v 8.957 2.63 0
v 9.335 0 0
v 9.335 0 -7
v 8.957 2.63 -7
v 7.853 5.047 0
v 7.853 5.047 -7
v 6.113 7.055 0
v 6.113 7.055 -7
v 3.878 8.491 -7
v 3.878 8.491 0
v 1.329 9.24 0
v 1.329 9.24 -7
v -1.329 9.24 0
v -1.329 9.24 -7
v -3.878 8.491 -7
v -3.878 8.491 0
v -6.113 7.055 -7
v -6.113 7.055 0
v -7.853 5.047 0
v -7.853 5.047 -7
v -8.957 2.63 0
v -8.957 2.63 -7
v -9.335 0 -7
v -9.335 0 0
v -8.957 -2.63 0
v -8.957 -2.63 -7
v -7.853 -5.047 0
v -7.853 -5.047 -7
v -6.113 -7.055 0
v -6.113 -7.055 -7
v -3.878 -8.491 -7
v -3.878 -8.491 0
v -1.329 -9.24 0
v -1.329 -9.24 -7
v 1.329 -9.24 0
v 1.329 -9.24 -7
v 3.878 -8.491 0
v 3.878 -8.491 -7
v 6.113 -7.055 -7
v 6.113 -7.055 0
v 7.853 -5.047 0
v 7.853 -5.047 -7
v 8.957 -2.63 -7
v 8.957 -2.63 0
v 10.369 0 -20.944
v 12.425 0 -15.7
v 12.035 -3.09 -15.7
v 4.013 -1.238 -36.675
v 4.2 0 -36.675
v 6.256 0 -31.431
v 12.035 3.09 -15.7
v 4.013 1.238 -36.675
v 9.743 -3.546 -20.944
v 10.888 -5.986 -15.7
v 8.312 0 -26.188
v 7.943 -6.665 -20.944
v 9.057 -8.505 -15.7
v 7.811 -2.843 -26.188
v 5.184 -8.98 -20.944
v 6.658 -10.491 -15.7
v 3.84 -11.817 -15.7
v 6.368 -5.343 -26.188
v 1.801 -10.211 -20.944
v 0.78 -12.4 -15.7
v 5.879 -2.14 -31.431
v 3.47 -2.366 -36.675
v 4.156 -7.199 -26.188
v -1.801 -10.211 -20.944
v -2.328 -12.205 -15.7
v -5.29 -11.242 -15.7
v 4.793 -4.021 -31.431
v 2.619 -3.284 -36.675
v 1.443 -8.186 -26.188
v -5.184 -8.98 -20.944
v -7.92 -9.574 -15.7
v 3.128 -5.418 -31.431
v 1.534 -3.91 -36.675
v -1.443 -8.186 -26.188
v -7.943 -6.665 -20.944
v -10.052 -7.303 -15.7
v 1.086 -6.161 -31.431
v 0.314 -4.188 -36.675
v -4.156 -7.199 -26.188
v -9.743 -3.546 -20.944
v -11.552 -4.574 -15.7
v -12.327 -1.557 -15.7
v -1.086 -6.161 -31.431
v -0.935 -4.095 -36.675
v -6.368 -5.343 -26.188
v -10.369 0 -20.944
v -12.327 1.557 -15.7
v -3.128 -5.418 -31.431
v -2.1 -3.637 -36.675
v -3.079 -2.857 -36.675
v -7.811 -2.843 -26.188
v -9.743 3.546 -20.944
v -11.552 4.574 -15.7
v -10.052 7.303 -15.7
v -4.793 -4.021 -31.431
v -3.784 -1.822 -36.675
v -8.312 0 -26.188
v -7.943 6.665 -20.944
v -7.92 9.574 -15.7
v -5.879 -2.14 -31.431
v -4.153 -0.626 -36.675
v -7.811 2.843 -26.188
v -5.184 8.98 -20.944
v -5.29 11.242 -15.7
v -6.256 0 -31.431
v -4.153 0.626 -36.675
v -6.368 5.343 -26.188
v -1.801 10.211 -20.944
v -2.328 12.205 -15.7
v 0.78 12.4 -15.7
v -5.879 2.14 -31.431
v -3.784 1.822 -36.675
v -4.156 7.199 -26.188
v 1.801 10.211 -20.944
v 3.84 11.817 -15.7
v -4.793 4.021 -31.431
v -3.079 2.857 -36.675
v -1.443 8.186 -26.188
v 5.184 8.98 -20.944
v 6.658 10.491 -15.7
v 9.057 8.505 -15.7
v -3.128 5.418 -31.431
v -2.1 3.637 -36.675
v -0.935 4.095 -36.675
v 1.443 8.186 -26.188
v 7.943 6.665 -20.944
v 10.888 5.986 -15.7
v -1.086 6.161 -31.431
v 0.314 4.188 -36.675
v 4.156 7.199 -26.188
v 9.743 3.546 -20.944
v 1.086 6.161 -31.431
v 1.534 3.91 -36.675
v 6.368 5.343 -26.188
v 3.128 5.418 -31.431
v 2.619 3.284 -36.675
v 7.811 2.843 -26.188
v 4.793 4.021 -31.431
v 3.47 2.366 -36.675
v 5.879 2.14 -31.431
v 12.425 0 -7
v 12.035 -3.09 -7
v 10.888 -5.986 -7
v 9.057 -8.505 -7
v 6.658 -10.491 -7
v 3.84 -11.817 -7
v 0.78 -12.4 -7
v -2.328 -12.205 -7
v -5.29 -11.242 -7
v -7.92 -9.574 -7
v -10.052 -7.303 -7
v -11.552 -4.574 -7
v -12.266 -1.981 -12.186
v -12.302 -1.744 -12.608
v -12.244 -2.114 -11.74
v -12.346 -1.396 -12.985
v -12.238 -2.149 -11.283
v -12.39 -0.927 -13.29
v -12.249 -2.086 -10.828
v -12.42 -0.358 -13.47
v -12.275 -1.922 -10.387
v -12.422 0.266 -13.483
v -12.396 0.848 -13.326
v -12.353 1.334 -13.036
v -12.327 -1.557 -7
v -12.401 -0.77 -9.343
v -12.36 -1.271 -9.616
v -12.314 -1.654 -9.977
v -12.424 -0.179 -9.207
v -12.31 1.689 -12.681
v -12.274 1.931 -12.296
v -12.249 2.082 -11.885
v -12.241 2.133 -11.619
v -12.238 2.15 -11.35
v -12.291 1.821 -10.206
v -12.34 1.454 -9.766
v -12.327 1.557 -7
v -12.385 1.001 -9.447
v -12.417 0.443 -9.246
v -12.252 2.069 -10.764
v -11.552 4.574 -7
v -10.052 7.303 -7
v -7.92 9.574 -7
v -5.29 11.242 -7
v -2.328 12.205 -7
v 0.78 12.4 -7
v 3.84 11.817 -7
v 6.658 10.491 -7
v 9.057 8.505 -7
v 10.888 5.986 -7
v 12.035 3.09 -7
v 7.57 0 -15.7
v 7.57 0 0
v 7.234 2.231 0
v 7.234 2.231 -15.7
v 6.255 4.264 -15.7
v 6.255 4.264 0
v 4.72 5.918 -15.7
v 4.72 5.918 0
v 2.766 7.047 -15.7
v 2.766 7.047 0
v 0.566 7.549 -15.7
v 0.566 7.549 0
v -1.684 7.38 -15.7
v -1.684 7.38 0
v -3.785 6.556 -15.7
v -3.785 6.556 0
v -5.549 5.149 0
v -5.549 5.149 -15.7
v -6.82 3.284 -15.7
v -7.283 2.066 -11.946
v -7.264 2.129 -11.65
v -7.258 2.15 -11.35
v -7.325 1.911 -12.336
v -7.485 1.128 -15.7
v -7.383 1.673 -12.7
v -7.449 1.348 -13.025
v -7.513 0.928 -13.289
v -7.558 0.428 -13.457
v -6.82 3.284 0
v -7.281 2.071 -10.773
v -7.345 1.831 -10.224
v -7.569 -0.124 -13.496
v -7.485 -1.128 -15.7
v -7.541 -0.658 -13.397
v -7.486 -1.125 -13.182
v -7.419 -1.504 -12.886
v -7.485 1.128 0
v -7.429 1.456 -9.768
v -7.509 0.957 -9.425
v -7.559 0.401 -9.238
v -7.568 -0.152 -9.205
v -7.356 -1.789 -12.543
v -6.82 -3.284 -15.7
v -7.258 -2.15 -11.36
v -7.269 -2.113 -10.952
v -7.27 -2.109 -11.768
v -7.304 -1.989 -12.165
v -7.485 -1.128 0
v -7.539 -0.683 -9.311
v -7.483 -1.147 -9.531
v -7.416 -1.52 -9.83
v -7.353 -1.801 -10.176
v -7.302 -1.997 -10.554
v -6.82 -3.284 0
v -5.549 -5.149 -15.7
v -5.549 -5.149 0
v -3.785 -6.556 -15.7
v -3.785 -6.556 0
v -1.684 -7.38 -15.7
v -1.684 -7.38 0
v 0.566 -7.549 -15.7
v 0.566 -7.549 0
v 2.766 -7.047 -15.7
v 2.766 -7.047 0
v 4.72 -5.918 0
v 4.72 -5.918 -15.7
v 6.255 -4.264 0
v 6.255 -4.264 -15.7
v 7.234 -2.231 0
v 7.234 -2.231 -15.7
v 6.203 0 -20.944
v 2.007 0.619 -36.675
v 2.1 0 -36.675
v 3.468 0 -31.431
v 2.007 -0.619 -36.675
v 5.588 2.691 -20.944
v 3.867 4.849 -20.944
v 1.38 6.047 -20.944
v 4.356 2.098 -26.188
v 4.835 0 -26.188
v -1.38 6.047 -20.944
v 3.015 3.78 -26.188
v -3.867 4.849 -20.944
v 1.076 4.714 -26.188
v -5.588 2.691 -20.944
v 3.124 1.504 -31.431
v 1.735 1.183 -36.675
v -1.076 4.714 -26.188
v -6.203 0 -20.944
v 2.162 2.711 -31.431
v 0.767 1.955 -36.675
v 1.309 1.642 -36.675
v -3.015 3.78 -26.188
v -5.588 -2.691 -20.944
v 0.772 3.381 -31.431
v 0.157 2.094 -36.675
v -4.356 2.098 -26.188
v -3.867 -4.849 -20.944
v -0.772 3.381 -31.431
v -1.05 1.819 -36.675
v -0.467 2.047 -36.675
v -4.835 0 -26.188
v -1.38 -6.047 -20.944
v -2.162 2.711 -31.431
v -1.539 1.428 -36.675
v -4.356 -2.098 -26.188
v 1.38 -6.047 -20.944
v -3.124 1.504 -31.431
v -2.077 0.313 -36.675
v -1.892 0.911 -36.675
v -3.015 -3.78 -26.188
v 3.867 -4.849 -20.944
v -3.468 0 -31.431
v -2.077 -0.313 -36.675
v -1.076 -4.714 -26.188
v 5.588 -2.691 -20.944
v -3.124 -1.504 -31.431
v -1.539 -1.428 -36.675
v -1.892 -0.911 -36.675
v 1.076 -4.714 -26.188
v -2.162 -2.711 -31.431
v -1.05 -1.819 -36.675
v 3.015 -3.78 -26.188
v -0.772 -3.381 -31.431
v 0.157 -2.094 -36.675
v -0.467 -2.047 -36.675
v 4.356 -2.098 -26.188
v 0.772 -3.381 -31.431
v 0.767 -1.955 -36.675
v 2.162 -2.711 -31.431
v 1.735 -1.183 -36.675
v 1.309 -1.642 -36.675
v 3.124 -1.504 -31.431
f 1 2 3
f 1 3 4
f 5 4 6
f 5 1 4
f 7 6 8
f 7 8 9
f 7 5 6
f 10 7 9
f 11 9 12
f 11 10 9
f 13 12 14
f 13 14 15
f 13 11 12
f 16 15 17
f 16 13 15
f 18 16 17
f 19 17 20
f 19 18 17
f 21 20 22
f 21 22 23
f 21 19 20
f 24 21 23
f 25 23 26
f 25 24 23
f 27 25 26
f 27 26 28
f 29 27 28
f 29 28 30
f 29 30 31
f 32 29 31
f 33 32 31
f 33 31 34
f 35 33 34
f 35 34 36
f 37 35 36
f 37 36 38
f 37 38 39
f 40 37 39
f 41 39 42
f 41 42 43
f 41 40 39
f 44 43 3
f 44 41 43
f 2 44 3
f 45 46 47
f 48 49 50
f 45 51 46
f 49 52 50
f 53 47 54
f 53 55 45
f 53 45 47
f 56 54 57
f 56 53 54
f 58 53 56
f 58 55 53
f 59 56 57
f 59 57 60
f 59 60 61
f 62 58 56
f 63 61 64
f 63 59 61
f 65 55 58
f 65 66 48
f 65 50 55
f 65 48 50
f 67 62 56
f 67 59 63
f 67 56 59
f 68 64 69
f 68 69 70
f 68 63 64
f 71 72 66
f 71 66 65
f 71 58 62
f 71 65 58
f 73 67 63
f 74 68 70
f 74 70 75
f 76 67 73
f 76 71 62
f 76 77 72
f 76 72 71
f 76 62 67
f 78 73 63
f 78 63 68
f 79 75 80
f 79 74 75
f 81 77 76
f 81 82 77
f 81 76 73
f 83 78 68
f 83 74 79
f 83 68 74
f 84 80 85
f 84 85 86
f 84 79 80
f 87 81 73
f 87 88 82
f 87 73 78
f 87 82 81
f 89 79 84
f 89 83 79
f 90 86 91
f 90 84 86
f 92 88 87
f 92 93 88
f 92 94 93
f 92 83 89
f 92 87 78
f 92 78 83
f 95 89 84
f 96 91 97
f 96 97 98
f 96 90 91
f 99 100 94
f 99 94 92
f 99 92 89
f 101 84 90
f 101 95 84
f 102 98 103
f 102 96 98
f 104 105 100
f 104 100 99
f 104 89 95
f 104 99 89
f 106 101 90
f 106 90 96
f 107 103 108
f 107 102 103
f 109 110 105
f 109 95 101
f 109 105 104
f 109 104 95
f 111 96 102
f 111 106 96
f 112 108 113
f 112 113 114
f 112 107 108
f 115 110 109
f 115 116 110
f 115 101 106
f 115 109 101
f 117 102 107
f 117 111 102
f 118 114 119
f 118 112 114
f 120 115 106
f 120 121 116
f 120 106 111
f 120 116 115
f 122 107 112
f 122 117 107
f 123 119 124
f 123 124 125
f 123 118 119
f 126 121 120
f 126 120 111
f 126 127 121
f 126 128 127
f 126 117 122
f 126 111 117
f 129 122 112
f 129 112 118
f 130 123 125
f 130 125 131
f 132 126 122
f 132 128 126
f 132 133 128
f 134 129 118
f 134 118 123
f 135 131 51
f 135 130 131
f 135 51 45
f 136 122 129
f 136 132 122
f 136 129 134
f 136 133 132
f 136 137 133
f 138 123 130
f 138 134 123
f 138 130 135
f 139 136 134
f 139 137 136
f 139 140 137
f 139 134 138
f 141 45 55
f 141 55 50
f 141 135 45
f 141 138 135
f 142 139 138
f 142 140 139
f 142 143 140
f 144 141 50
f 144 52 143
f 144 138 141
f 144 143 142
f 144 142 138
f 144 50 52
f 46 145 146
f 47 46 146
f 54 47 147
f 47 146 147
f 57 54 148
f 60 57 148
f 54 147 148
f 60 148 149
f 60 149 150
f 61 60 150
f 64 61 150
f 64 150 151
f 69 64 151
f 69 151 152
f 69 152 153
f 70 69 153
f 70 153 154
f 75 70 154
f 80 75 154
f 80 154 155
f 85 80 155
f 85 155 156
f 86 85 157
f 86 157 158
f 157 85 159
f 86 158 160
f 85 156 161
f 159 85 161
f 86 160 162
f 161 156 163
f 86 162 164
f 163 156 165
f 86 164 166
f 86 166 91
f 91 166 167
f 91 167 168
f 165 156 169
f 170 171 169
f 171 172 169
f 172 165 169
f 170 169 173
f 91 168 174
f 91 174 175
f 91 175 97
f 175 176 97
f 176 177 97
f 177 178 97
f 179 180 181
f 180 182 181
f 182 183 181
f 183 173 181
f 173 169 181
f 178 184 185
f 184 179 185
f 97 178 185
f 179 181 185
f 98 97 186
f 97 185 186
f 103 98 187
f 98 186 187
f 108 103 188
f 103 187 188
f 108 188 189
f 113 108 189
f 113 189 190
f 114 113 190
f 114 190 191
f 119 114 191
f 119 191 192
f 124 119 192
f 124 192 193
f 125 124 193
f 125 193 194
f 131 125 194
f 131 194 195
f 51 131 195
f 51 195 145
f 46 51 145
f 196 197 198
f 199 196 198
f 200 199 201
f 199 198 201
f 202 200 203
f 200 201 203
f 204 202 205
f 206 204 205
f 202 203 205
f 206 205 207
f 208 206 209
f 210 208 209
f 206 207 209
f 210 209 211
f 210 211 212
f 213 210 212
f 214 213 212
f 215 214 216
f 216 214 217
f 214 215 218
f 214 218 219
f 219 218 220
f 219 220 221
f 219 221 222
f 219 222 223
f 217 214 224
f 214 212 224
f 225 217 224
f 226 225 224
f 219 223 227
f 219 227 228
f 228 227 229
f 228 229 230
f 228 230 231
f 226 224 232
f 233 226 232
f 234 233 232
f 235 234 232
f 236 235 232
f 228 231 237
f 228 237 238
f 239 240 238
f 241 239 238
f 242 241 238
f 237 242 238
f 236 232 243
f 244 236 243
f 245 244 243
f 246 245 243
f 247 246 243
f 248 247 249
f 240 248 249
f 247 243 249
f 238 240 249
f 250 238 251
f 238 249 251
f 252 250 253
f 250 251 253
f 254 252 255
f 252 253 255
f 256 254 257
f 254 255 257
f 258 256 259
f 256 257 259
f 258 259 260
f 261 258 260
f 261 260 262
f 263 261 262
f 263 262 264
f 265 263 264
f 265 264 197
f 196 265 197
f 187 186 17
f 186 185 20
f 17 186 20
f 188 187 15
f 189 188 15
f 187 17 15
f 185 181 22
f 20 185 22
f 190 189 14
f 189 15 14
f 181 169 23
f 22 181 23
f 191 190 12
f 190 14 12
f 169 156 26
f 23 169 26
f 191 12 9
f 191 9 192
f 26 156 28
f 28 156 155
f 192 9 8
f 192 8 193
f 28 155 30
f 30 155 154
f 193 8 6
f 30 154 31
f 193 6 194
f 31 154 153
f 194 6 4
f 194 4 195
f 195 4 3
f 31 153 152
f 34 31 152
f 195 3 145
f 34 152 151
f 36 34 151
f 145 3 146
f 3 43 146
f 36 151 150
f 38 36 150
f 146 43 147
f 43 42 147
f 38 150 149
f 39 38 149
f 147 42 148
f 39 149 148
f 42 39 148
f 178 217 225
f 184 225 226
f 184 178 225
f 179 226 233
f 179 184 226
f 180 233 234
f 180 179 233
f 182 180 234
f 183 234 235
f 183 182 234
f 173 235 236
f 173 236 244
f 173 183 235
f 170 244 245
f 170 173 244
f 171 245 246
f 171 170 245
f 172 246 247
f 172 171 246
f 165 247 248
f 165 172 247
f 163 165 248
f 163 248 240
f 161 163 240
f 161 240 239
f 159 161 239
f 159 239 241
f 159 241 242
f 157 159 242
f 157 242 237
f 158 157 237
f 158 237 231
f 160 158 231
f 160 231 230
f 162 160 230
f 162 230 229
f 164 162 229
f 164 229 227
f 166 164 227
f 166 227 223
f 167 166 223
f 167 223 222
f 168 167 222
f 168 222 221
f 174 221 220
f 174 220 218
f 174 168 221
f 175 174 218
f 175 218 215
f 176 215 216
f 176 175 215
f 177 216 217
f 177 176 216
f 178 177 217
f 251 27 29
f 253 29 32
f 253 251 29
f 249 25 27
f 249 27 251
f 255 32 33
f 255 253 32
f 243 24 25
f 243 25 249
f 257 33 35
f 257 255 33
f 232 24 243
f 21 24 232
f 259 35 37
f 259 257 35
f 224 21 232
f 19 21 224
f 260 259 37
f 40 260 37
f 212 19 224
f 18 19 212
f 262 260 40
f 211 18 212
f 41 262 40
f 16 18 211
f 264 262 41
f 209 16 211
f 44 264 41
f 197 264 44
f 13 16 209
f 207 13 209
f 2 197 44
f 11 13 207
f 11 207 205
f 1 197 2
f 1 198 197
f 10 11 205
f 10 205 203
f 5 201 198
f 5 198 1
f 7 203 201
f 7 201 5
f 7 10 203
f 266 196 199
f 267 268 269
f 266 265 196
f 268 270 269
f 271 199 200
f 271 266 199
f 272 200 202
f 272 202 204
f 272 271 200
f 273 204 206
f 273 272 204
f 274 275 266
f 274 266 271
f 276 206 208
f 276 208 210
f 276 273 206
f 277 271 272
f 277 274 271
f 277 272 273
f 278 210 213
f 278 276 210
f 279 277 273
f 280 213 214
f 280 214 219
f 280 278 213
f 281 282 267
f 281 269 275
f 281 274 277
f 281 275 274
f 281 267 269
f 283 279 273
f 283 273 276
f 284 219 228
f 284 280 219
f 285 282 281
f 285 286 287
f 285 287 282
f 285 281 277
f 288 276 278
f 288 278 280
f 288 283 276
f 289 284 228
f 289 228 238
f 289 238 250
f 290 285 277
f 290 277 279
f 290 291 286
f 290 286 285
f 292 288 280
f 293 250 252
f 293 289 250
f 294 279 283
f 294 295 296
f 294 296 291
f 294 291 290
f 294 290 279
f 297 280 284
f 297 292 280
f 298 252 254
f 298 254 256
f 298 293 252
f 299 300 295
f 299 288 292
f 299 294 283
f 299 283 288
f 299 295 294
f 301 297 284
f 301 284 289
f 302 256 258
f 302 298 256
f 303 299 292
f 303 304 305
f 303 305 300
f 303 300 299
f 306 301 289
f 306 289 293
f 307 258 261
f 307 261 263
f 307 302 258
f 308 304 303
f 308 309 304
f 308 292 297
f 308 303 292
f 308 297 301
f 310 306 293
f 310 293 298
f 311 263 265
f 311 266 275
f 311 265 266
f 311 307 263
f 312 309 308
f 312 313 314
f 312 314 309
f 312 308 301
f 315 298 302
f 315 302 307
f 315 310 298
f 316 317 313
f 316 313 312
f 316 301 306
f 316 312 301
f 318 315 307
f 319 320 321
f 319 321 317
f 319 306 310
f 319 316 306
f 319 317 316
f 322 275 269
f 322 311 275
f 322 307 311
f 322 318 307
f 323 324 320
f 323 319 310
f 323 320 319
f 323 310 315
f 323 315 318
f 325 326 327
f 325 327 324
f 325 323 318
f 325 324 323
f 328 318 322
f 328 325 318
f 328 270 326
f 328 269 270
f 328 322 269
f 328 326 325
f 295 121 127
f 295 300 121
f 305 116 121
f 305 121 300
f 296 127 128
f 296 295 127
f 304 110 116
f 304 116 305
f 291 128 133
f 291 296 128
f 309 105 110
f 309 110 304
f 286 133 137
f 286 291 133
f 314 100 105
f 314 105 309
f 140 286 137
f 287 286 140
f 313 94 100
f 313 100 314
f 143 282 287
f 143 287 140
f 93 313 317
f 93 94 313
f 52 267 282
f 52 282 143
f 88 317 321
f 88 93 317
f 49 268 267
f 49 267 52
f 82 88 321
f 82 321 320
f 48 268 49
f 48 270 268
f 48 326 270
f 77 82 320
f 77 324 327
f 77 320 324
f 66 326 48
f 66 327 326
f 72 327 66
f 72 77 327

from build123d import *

# Parameters (mm, degrees)
F0_R      = 9.335
F1_DEPTH  = 7
F2_R      = 12.425
F2_R_2    = 9.335
F3_DEPTH  = 8.7
F3_FACE_R = 12.425
F5_R      = 4.2
F8_R      = 7.57
F10_DEPTH = 15.7
F11_R     = 7.57
F9_R      = 2.1
F13_R     = 2.15
F14_REACH = 30.9321184182


with BuildPart() as f1:
    # F0 (on Top) → F1 (new body)
    with BuildSketch(Plane.XY):
        Circle(F0_R)
    extrude(amount=-F1_DEPTH)

    # F2 (on face) → F3 (join)
    with BuildSketch(Plane(origin=(0, 0, -7), x_dir=(1, 0, 0), z_dir=(0, 0, -1))):
        Circle(F2_R)
        Circle(F2_R_2, mode=Mode.SUBTRACT)
        Circle(F2_R_2)
    extrude(amount=F3_DEPTH)

    # F3_face (on face) → F6 section 0
    with BuildSketch(Plane(origin=(0, 0, -15.7), x_dir=(1, 0, 0), z_dir=(0, 0, -1))):
        Circle(F3_FACE_R)
    # F5 (on offset) → F6 section 1
    with BuildSketch(Plane(origin=(0, 0, -36.675), x_dir=(1, 0, 0), z_dir=(0, 0, -1))):
        Circle(F5_R)
    loft()

    # F8 (on face) → F10 (cut)
    with BuildSketch(Plane.XY):
        Circle(F8_R)
    extrude(amount=-F10_DEPTH, mode=Mode.SUBTRACT)

    # F11 (on face) → F12 section 0
    with BuildSketch(Plane.XY.offset(-15.7)):
        Circle(F11_R)
    # F9 (on face) → F12 section 1
    with BuildSketch(Plane(origin=(0, 0, -36.675), x_dir=(1, 0, 0), z_dir=(0, 0, -1))):
        Circle(F9_R)
    loft(mode=Mode.SUBTRACT)

    f14_end = f1.faces().sort_by_distance((-7.57, 0, -7.85))[0]
    # F13 (on offset) → F14 (cut, up to a face of the model that its end follows)
    with BuildSketch(Plane.YZ.offset(-12.425)):
        with Locations((0, -11.35)):
            Circle(F13_R)
    f14_long = extrude(amount=F14_REACH, mode=Mode.PRIVATE)
    add(split(f14_long, bisect_by=f14_end, keep=Keep.ALL, mode=Mode.PRIVATE).solids().sort_by_distance((-12.425, 0, -11.35))[0], mode=Mode.SUBTRACT)


solid = f1.part
